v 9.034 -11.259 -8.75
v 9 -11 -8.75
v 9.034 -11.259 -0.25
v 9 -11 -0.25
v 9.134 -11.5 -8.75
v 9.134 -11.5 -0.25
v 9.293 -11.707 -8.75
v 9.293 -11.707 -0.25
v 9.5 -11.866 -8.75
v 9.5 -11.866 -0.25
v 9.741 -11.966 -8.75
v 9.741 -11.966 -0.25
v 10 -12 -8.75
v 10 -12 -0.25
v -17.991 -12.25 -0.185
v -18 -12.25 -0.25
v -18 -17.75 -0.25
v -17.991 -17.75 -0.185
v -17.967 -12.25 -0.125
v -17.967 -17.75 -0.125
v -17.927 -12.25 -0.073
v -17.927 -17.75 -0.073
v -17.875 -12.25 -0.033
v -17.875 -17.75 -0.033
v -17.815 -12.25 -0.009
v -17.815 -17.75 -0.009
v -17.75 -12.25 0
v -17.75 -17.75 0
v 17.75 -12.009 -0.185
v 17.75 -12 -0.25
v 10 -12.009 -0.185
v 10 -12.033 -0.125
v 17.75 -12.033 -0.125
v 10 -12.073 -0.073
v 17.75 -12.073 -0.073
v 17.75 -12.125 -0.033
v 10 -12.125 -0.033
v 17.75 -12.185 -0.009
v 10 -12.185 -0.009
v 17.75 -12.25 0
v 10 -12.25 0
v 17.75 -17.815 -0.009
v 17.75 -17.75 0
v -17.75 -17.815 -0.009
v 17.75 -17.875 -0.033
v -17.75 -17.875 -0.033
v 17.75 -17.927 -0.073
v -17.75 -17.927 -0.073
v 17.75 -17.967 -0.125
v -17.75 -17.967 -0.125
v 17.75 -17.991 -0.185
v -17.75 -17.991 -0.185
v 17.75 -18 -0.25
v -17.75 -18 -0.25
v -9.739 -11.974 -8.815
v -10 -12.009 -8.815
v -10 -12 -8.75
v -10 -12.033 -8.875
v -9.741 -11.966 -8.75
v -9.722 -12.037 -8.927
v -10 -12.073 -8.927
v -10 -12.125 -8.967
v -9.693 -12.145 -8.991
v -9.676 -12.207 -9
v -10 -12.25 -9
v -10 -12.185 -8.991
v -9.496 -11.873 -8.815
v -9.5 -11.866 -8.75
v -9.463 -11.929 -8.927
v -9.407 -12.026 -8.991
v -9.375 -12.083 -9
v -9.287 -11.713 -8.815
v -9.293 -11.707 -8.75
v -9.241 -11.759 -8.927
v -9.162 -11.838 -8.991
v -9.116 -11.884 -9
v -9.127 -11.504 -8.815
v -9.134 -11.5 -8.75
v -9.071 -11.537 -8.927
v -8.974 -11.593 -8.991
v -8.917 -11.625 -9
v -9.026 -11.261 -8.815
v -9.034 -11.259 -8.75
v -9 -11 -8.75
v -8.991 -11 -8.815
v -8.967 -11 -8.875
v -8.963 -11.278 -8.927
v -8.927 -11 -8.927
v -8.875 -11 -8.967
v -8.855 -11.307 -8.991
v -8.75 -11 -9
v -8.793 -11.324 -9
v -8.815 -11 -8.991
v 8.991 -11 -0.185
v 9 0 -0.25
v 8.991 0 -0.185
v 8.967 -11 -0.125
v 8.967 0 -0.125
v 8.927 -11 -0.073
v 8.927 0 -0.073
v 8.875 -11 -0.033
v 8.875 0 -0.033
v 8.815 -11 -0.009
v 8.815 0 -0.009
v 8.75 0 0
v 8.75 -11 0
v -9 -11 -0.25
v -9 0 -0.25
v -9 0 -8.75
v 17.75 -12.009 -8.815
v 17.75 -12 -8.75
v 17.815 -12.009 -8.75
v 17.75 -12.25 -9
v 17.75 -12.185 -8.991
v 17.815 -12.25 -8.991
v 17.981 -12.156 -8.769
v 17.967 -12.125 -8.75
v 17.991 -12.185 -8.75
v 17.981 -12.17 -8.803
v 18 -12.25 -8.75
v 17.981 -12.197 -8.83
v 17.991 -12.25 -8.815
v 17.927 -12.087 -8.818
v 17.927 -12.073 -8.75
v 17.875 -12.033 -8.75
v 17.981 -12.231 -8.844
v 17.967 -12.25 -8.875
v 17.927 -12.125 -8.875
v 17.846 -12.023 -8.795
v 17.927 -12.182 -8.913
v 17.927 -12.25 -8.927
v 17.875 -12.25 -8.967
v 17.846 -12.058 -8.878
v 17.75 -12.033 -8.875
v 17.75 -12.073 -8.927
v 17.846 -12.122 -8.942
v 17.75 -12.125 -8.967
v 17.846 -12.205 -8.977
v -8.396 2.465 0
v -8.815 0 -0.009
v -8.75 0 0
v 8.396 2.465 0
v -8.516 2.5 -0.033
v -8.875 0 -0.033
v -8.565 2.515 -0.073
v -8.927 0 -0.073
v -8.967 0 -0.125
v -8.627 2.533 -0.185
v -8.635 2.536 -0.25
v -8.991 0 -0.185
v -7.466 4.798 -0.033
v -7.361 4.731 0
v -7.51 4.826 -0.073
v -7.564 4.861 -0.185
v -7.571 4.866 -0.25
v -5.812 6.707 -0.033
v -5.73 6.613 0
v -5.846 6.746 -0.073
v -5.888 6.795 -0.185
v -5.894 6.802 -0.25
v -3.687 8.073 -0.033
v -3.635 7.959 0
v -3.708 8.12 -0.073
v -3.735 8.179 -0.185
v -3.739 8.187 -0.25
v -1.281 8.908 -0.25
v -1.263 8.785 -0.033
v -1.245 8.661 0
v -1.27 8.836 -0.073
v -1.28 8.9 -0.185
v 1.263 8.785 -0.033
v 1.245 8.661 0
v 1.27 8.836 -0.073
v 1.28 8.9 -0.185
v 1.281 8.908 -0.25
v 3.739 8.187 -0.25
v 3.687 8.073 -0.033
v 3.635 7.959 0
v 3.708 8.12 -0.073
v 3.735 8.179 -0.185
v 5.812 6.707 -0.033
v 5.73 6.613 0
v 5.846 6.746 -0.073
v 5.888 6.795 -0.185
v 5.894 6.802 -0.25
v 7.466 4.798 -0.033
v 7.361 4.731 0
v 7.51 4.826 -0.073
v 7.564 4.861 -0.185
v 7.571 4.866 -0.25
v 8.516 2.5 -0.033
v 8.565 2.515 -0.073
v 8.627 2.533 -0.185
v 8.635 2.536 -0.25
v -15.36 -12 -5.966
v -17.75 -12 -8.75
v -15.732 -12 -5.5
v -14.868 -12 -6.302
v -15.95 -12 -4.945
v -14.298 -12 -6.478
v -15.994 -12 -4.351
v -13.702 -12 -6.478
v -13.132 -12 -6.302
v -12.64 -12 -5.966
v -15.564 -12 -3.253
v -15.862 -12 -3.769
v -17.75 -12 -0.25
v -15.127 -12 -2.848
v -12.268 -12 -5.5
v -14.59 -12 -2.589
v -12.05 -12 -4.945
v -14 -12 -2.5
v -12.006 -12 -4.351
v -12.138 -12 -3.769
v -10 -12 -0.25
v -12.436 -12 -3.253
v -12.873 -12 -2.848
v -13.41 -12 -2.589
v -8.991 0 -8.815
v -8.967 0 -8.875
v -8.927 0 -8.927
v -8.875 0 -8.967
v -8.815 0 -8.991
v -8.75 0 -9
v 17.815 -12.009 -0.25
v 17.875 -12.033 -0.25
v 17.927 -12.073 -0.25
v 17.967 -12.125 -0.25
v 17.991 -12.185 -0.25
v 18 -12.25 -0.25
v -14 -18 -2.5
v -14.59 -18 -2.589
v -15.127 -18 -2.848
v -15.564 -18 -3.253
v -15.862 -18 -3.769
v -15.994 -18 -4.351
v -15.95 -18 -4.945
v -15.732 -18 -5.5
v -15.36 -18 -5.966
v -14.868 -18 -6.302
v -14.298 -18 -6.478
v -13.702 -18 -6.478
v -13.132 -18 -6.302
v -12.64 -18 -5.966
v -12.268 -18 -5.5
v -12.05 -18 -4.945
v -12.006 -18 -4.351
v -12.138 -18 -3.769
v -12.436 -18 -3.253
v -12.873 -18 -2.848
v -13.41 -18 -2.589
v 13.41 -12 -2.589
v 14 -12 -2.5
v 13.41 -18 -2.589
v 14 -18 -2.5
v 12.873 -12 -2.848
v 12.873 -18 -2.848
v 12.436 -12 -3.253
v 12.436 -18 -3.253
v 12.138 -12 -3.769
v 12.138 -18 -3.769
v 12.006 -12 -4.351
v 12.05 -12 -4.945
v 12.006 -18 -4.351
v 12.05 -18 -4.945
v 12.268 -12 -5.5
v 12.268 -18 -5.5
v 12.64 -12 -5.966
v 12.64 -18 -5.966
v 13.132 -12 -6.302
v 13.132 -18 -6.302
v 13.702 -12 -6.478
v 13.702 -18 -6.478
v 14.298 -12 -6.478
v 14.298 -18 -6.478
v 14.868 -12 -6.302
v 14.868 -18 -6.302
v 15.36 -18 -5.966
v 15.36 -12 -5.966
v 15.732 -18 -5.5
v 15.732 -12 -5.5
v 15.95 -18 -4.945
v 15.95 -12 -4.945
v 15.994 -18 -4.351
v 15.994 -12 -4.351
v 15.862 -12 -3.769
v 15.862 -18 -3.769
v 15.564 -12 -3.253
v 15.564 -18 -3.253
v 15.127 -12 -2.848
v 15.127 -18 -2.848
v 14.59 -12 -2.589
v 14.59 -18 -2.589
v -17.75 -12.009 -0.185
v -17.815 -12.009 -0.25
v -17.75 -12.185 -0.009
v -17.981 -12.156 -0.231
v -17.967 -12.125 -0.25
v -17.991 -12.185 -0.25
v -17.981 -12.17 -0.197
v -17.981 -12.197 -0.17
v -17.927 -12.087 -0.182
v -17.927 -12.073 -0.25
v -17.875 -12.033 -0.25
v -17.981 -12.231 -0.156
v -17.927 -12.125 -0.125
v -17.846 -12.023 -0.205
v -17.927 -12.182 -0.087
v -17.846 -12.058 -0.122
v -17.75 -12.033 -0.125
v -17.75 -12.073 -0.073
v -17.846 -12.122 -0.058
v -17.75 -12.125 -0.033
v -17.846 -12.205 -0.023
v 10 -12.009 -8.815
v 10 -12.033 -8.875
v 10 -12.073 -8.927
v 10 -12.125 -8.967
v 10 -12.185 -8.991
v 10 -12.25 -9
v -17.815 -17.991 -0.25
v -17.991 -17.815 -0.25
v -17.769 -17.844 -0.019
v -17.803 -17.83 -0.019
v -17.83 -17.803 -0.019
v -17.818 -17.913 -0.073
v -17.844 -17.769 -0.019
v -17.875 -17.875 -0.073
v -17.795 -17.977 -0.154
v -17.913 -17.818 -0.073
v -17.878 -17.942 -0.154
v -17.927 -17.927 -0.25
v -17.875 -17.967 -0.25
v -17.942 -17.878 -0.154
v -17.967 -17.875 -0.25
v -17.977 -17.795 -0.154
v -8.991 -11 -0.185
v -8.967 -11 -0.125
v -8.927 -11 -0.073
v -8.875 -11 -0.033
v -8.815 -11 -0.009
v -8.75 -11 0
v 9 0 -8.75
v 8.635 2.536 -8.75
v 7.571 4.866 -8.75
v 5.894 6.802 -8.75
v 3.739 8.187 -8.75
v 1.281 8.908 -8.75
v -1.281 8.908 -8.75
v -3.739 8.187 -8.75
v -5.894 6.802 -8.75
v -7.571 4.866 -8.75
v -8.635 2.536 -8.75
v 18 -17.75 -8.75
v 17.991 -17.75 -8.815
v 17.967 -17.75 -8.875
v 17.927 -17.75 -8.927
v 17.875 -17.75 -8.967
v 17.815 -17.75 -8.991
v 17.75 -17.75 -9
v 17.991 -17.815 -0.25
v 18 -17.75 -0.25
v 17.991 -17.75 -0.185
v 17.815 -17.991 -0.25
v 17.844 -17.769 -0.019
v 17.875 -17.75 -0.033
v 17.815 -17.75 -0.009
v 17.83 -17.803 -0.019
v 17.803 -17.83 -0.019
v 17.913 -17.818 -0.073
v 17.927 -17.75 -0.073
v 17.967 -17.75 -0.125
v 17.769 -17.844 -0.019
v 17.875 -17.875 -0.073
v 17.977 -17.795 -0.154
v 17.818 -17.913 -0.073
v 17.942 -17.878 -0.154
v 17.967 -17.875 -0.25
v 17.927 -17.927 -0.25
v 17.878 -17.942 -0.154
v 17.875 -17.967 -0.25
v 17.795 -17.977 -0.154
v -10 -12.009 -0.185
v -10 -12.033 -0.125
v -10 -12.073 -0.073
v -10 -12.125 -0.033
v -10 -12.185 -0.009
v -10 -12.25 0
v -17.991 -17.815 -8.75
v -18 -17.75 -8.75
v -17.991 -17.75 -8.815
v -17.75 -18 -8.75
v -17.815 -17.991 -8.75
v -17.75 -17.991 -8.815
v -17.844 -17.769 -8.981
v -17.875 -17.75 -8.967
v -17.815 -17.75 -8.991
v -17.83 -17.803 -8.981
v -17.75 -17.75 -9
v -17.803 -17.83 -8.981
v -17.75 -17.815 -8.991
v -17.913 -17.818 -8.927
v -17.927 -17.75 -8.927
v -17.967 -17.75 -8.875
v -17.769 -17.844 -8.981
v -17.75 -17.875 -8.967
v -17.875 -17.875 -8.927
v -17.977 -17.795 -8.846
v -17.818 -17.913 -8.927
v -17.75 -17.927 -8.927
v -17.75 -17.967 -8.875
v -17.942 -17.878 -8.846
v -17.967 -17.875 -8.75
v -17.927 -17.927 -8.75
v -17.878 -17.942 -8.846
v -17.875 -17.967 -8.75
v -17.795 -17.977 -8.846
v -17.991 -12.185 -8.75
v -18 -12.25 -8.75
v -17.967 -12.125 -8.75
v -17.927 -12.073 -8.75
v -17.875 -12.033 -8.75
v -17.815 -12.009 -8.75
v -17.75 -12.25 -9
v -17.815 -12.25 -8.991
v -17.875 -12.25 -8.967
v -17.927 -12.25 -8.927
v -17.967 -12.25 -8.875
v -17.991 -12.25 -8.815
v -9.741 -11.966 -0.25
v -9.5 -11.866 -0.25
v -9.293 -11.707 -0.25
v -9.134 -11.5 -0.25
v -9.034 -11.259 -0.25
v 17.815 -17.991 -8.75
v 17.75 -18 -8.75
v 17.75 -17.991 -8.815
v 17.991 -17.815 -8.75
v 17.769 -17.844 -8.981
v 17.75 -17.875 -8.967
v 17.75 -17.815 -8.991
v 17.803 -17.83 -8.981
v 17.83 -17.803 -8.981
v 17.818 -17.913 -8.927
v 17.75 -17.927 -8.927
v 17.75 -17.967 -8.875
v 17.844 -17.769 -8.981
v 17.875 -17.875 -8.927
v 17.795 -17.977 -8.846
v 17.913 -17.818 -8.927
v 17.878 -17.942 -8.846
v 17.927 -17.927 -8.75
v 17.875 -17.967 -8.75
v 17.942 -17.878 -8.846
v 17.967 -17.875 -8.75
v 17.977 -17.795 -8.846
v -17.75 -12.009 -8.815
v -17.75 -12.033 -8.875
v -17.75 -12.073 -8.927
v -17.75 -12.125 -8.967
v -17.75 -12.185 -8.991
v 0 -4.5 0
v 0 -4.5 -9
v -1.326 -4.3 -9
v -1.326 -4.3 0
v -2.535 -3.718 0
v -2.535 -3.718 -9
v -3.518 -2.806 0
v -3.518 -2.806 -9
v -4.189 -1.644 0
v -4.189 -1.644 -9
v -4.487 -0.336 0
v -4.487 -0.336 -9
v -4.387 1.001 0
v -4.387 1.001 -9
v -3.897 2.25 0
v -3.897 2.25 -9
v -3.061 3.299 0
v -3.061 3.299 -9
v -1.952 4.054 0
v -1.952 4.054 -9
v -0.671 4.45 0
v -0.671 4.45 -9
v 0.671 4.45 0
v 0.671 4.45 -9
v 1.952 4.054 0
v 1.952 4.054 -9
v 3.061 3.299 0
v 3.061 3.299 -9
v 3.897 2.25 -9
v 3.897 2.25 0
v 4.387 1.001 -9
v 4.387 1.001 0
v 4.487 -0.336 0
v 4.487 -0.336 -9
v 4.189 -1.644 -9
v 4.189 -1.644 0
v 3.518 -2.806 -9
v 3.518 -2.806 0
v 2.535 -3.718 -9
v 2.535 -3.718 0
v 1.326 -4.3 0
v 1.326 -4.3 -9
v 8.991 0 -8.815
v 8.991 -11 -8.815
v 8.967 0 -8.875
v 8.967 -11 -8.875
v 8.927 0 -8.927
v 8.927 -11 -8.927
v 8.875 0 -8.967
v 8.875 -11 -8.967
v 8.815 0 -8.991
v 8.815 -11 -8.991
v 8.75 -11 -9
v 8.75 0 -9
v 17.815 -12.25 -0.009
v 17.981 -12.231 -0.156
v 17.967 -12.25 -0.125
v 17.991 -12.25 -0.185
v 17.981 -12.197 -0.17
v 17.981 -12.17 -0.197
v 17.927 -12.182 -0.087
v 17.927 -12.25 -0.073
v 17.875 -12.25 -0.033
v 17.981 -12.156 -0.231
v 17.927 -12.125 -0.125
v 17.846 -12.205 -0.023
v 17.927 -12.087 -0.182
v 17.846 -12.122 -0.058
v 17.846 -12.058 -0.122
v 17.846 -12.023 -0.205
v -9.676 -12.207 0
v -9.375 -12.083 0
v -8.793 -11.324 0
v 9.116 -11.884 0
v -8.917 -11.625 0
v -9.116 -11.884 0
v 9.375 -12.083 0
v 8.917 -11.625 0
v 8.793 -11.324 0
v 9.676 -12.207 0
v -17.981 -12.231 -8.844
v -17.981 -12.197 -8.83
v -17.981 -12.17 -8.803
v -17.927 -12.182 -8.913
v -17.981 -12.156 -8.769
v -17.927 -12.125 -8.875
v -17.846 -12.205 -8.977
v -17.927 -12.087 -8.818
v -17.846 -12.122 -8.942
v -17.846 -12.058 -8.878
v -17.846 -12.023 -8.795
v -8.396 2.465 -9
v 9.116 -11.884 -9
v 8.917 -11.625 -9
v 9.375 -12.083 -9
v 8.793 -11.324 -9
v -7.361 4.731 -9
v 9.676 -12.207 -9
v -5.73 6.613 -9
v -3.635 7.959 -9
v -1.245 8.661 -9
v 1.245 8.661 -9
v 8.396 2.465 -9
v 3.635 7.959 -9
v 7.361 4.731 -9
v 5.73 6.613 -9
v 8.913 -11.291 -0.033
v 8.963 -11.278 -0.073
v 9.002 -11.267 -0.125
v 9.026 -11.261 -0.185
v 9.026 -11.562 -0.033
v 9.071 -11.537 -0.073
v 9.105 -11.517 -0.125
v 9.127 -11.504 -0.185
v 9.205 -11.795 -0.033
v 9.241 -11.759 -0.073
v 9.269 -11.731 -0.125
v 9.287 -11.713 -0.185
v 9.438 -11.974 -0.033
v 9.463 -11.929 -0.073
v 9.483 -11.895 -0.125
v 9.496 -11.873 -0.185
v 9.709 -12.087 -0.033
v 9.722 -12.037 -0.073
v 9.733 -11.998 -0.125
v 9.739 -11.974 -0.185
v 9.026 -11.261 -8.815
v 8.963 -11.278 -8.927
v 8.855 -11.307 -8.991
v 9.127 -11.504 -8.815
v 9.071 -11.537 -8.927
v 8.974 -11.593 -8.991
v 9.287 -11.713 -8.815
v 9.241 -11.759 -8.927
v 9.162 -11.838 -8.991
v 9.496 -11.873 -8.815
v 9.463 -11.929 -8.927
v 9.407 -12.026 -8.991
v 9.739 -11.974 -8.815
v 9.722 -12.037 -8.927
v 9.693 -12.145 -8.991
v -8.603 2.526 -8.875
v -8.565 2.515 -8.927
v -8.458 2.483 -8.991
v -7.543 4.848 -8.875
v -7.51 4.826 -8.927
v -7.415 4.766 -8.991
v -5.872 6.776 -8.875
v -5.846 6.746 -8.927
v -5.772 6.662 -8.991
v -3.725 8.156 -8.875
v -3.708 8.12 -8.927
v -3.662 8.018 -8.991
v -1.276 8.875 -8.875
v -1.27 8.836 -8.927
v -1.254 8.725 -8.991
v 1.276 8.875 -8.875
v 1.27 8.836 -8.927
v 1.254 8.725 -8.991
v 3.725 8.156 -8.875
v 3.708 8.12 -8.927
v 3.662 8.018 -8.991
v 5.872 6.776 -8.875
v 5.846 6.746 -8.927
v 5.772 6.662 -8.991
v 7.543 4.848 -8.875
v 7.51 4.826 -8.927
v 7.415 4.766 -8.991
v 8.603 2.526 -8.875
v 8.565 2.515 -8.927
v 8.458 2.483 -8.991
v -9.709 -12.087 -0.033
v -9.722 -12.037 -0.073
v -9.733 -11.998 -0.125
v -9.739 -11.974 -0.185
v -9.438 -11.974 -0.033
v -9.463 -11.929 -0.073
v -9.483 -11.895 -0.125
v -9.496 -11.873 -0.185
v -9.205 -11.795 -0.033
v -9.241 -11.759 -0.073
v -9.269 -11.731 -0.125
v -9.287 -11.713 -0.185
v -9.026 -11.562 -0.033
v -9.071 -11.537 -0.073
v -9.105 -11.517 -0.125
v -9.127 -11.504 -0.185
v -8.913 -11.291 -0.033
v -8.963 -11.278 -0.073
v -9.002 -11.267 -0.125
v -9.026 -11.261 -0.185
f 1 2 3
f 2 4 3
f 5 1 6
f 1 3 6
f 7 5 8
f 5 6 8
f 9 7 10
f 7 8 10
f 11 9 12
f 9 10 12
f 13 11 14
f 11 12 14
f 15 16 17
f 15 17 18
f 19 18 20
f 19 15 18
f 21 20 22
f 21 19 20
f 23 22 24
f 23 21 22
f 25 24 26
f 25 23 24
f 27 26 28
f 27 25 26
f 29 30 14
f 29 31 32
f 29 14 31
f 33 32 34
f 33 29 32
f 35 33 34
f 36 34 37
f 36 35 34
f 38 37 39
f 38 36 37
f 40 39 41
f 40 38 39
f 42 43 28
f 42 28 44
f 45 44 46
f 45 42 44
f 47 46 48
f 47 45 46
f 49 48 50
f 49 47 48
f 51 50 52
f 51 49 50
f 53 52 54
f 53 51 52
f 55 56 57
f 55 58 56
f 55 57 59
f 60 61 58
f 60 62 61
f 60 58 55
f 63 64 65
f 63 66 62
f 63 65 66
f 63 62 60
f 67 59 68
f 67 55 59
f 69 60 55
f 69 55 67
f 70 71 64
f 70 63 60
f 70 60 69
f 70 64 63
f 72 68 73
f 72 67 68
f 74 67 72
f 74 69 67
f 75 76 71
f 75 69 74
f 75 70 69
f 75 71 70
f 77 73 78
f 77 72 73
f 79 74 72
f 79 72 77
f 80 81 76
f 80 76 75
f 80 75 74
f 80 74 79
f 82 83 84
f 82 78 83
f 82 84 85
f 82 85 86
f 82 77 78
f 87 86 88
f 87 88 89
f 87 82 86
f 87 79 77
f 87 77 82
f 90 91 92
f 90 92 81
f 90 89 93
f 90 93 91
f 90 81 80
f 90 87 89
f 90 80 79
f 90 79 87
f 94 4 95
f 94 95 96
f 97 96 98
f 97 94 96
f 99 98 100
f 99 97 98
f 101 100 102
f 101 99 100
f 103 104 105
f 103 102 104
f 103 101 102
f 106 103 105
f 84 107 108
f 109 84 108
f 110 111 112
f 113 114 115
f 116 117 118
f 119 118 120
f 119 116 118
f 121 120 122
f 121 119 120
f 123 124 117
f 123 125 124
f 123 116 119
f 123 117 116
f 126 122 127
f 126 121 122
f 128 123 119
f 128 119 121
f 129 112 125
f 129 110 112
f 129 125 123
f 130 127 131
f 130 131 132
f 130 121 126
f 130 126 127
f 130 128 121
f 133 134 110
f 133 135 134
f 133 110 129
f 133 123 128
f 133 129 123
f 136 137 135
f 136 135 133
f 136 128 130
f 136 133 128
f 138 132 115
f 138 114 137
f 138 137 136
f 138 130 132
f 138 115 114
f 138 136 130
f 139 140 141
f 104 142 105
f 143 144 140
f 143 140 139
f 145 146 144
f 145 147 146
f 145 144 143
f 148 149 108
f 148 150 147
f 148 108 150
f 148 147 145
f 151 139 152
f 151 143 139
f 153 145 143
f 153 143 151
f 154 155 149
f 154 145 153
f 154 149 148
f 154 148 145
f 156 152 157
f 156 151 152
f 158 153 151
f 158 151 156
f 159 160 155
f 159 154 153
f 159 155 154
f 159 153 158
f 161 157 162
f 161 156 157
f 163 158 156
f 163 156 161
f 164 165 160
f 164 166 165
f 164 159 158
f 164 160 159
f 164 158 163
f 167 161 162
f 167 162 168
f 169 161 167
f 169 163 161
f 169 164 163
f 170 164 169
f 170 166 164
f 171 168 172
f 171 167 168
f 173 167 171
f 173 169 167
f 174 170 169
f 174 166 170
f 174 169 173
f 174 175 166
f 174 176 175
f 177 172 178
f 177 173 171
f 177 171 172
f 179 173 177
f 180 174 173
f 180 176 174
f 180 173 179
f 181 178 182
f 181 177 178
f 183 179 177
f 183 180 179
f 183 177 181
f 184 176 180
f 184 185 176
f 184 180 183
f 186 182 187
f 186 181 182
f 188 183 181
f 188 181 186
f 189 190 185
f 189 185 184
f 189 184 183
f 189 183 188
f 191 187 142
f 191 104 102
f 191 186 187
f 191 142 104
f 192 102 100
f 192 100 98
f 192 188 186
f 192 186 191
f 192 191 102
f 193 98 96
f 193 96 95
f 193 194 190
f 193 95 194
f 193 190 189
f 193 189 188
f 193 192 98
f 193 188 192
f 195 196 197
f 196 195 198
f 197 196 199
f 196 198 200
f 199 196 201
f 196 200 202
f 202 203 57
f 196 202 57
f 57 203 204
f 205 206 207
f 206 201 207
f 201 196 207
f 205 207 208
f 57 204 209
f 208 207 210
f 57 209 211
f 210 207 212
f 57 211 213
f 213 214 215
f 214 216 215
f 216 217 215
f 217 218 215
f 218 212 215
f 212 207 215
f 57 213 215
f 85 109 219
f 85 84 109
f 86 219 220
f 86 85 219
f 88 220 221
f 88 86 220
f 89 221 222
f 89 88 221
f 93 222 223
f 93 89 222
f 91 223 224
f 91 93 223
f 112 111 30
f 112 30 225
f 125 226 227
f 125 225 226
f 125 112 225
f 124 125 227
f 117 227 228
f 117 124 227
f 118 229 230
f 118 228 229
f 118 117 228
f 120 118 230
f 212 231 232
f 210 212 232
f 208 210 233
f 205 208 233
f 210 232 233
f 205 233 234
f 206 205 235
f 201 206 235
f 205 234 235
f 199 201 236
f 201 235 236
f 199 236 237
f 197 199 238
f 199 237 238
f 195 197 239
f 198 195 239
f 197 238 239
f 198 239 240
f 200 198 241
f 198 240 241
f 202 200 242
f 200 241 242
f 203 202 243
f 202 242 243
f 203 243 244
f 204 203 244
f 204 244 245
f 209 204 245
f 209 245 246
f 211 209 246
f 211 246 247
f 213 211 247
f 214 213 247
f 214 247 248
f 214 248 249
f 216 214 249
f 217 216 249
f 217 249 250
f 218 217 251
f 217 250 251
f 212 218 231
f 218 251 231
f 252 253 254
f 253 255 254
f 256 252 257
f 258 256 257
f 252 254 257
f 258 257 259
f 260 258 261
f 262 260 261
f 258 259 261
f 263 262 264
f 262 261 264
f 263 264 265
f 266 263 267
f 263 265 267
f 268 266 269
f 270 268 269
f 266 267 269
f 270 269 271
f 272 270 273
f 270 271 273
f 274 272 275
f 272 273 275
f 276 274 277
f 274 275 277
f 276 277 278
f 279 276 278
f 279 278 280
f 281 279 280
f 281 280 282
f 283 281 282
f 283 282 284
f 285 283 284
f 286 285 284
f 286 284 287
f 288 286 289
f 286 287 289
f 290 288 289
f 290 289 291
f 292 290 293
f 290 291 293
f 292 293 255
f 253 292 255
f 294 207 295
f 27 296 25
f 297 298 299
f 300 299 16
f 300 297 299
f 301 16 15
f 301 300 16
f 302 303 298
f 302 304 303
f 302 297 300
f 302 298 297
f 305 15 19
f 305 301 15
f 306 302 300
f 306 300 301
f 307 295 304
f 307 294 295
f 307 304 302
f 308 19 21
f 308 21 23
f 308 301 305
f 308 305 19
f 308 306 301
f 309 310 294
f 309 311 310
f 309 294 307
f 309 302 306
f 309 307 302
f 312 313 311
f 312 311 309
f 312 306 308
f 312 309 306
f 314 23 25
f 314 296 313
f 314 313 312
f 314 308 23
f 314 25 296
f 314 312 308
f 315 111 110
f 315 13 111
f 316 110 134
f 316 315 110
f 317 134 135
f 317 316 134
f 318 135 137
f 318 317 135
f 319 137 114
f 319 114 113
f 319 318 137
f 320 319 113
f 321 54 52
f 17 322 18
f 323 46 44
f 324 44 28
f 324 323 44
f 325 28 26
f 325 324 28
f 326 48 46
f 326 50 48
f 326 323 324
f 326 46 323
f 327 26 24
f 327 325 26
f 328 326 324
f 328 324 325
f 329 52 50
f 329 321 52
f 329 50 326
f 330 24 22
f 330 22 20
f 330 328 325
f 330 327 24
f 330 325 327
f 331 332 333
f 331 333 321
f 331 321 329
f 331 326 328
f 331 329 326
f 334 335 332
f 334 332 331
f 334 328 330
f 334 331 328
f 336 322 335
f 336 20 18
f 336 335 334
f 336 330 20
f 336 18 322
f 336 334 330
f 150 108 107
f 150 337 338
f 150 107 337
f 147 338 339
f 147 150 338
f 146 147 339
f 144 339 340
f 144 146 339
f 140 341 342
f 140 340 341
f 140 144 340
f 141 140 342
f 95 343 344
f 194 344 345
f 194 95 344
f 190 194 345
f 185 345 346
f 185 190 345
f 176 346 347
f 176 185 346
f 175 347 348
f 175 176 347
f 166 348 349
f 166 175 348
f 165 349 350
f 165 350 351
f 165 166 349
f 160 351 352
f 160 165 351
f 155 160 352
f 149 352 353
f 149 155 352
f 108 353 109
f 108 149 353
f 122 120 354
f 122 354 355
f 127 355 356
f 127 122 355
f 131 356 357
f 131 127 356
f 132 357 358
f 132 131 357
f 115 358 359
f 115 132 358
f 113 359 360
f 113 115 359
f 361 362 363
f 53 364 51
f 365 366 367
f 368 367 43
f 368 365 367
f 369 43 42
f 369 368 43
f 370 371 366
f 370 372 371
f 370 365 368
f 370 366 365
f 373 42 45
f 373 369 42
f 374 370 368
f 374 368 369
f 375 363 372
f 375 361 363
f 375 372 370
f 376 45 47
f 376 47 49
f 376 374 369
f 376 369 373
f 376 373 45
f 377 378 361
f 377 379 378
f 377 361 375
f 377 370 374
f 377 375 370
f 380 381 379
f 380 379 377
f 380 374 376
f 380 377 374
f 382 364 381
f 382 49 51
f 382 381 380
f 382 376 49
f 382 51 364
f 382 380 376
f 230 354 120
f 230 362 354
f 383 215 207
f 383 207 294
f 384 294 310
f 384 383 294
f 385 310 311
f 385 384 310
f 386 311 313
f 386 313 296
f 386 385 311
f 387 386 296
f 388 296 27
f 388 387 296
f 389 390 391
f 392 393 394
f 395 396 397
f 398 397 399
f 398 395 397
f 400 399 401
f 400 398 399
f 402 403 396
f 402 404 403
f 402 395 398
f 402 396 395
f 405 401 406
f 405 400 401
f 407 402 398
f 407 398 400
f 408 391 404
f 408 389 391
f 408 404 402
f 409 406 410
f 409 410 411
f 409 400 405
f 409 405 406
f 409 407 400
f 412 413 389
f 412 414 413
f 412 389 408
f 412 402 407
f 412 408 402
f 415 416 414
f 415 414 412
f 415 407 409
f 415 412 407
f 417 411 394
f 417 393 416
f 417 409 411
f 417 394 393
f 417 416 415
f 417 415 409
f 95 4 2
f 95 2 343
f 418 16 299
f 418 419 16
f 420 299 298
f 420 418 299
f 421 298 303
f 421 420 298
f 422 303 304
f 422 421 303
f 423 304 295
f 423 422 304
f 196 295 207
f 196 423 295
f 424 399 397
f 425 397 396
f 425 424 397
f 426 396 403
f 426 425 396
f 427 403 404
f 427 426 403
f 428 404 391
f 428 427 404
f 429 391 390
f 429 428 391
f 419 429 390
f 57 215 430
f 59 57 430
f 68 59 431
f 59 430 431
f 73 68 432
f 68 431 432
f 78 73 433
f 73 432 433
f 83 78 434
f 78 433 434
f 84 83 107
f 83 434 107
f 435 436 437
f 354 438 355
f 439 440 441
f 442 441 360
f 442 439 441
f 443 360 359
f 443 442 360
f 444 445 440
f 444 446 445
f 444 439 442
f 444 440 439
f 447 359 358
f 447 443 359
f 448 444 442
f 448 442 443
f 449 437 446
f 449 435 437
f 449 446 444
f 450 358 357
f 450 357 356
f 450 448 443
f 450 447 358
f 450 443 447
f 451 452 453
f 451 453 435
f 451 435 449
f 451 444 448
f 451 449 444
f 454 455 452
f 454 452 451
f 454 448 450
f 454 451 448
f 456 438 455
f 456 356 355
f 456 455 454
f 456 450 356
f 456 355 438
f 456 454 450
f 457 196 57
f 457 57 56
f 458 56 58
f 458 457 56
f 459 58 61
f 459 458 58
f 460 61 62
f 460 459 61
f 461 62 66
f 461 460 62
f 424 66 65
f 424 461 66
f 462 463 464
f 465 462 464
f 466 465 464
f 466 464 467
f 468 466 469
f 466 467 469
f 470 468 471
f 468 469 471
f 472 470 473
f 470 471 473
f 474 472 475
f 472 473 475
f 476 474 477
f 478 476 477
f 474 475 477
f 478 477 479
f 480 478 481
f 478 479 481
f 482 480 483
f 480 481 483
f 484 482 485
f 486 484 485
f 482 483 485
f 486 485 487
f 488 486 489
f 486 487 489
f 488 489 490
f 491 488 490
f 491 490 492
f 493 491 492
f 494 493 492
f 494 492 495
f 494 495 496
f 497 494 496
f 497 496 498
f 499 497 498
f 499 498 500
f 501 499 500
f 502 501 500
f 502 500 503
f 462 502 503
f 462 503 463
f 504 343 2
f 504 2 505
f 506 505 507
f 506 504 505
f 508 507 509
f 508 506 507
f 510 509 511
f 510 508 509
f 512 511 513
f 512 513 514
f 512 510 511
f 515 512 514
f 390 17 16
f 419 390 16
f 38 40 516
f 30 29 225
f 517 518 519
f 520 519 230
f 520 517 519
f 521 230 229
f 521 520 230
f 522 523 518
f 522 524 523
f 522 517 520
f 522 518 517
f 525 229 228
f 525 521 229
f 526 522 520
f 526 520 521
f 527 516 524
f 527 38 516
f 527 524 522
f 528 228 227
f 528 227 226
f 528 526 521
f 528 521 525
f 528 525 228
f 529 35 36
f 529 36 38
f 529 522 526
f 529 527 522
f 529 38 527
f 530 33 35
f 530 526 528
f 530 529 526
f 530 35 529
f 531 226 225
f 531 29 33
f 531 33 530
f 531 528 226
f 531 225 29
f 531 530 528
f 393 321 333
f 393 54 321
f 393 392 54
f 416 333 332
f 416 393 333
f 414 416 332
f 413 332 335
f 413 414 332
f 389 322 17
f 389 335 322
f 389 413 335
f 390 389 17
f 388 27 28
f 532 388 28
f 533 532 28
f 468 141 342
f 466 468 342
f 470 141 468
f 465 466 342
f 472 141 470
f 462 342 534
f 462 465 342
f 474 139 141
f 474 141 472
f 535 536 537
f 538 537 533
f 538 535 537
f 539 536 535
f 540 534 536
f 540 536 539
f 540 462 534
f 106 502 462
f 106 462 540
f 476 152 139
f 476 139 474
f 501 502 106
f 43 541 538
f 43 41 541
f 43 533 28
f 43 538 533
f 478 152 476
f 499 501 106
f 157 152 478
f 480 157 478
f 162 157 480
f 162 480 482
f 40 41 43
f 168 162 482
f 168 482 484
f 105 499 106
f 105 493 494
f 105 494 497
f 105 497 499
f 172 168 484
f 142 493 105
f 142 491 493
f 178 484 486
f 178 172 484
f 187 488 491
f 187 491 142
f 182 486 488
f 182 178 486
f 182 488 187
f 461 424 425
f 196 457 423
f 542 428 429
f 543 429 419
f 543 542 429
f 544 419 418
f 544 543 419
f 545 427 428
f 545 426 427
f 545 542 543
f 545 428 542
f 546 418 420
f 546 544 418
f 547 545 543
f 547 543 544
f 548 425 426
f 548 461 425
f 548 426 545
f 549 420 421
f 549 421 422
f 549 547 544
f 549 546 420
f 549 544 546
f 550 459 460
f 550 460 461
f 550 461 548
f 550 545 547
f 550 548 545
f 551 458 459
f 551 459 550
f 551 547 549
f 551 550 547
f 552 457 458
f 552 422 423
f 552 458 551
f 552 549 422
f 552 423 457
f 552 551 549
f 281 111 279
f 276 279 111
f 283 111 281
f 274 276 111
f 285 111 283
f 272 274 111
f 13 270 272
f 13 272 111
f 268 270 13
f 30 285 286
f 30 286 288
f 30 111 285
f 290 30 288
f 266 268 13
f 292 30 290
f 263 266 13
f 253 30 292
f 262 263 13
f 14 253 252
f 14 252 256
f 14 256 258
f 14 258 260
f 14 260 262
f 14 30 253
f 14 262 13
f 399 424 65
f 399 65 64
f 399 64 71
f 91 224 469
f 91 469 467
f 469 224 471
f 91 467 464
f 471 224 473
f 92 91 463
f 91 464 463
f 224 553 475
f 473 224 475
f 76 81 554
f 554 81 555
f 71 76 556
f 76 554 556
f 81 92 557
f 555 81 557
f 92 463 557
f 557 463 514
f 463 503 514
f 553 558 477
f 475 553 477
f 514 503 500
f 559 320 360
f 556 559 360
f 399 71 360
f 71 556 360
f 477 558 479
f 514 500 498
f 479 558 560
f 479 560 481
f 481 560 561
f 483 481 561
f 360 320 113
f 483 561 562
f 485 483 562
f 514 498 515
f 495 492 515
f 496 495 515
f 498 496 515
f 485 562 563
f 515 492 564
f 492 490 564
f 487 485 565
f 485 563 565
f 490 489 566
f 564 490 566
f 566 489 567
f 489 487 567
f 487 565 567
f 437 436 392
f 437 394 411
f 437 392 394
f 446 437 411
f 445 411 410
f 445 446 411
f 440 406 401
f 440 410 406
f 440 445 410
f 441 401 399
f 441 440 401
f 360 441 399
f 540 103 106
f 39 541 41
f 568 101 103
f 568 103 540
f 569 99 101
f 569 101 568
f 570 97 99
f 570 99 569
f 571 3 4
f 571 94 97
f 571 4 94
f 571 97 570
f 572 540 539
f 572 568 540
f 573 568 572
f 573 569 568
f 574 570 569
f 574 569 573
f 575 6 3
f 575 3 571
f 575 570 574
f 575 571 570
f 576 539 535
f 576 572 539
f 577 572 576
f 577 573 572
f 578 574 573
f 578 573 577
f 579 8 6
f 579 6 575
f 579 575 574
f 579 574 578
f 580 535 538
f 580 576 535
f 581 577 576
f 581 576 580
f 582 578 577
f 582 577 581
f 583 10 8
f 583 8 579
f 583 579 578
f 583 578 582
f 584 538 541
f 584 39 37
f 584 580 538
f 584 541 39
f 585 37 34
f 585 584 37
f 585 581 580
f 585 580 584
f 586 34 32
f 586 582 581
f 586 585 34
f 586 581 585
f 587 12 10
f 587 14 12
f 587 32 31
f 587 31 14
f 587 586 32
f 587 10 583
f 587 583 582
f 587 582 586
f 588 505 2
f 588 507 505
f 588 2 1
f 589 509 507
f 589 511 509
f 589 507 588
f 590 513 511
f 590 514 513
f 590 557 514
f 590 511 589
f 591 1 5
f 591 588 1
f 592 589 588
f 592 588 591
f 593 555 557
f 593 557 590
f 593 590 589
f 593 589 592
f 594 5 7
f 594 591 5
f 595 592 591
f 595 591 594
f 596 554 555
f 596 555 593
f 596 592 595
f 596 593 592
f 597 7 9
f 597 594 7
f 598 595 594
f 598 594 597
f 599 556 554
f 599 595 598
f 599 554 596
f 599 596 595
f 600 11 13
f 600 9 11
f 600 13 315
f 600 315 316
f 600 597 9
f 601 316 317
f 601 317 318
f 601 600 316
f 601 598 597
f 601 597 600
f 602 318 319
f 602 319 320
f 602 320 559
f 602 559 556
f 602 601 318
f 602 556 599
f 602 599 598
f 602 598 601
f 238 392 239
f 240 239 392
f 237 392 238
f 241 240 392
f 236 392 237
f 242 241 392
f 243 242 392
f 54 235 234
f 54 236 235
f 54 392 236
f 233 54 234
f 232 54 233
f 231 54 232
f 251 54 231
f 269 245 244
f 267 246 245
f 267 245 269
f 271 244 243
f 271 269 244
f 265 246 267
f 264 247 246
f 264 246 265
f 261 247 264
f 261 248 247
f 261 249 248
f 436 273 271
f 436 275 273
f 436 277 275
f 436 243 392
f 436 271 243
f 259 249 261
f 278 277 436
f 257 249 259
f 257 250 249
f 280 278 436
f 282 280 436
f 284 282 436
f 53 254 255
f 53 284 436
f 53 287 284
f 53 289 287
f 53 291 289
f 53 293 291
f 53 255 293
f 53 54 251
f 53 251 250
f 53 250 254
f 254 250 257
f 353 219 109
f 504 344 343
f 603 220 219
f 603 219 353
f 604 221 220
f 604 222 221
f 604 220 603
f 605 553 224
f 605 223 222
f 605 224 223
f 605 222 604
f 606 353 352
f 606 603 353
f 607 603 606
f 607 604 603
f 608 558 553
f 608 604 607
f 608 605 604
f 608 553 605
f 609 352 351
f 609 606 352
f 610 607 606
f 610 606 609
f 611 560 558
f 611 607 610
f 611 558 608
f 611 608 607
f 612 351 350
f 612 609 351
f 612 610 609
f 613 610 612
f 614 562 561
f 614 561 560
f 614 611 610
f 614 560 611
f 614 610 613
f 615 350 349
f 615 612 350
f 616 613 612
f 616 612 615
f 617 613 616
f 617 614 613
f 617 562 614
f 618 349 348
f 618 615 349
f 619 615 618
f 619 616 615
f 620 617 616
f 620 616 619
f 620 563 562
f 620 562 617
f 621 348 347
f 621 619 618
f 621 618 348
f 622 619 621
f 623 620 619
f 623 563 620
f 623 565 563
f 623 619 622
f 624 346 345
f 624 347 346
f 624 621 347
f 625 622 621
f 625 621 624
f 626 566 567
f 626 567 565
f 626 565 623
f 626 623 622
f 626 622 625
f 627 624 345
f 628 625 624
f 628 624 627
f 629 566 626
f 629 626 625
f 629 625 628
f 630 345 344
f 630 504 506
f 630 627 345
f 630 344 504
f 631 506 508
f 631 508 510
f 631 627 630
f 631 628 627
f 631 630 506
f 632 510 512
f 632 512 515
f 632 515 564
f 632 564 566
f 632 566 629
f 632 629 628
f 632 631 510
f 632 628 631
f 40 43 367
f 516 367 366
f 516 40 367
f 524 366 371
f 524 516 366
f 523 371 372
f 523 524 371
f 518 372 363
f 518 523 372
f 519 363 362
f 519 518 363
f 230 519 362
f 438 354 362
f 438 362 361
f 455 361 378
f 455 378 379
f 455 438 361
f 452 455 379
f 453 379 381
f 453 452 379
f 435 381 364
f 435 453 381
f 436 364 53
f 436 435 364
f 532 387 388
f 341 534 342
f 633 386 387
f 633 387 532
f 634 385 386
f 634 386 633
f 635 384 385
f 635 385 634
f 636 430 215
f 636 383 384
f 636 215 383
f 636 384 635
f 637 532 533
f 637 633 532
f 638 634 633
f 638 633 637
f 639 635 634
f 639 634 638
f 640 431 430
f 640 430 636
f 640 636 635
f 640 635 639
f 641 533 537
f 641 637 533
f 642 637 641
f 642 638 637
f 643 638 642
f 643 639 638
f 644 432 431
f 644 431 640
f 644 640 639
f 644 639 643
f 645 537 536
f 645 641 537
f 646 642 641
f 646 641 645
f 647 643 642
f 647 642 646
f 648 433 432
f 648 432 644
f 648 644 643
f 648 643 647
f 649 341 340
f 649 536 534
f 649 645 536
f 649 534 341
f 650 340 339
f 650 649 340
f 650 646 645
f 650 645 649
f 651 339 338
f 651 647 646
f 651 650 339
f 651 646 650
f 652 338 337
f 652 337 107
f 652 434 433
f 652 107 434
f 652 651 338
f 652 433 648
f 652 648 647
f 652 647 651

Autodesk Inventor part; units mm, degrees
ref_plane "YZ Plane" through (0, 0, 0) normal (1, 0, 0) x (0, 1, 0)
ref_plane "XZ Plane" through (0, 0, 0) normal (0, 1, 0) x (-1, 0, 0)
ref_plane "XY Plane" through (0, 0, 0) normal (0, 0, 1) x (1, 0, 0)
sketch "Sketch1" plane through (0, 0, 0) normal (0, 0, 1) x (1, 0, 0)
  circle A0 centre (0, 0) radius 4.5
  arc A1 (9, 0) -> (-9, 0) centre (0, 0) ccw
  line L0 (0, 0) -> (0, -47) construction
  line L1 (0, -18) -> (-18, -18)
  line L2 (0, -18) -> (18, -18)
  line L3 (18, -18) -> (18, -12)
  line L4 (18, -12) -> (10, -12)
  line L5 (9, -11) -> (9, 0)
  line L6 (-18, -18) -> (-18, -12)
  line L7 (-18, -12) -> (-10, -12)
  line L8 (-9, -11) -> (-9, 0)
  arc A2 (-10, -12) -> (-9, -11) centre (-10, -11) ccw
  arc A3 (9, -11) -> (10, -12) centre (10, -11) ccw
  dimension "d0" = 9
  dimension "d1" = 18
  dimension "d6" = 6
  dimension "d7" = 6
  dimension "d9" = 18
  dimension "d10" = 2
  dimension "d11" = 2
  dimension "d12" = 9
  dimension "d13" = 9
  dimension "d14" = 36
  dimension "d15" = 18
extrude "Extrusion1" add sketch "Sketch1" against normal blind 9 contours A0 | L5 A3 L4 L3 L2 L1 L6 L7 A2 L8 A1
hole "Hole1" at (0, 0, 0) direction (0, 0, -1) diameter 9 end through all
sketch "Sketch2" plane through (-18, -12, 0) normal (0, 1, 0) x (1, 0, 0)
  circle A0 centre (4, 4.5) radius 2
  circle A1 centre (32, 4.5) radius 2
  line L0 (8, 0) -> (0, 0) projected
  line L1 (0, 0) -> (0, 9) projected
  line L2 (36, 0) -> (28, 0) projected
  line L3 (36, 0) -> (36, 9) projected
  point P0 (18, 0)
  dimension "d25" = 4
  dimension "d26" = 4
  dimension "d27" = 4.5
  dimension "d28" = 4
  dimension "d29" = 4.5
  dimension "d30" = 4
hole "Hole2" at (-14, -12, -4.5) at (14, -12, -4.5) direction (0, -1, 0) diameter 4 end through all
fillet "Fillet1" radius 0.25 24 edges at (9, -5.5, -9) (9.2929, -11.7071, -9) (14, -12, -9) (-9, -5.5, -9) (-9.2929, -11.7071, -9) (-14, -12, -9) (0, 9, -9) (-9, -5.5, 0) (-9.2929, -11.7071, 0) (-14, -12, 0) (9, -5.5, 0) (9.2929, -11.7071, 0) (14, -12, 0) (0, 9, 0) (18, -12, -4.5) (-18, -12, -4.5) (18, -18, -4.5) (18, -15, -9) (18, -15, 0) (-18, -18, -4.5) (-18, -15, 0) (-18, -15, -9) (0, -18, -9) (0, -18, 0)
properties part number "HUDSON 1-04-REAR DRAWBAR BEAM BRACKET"
